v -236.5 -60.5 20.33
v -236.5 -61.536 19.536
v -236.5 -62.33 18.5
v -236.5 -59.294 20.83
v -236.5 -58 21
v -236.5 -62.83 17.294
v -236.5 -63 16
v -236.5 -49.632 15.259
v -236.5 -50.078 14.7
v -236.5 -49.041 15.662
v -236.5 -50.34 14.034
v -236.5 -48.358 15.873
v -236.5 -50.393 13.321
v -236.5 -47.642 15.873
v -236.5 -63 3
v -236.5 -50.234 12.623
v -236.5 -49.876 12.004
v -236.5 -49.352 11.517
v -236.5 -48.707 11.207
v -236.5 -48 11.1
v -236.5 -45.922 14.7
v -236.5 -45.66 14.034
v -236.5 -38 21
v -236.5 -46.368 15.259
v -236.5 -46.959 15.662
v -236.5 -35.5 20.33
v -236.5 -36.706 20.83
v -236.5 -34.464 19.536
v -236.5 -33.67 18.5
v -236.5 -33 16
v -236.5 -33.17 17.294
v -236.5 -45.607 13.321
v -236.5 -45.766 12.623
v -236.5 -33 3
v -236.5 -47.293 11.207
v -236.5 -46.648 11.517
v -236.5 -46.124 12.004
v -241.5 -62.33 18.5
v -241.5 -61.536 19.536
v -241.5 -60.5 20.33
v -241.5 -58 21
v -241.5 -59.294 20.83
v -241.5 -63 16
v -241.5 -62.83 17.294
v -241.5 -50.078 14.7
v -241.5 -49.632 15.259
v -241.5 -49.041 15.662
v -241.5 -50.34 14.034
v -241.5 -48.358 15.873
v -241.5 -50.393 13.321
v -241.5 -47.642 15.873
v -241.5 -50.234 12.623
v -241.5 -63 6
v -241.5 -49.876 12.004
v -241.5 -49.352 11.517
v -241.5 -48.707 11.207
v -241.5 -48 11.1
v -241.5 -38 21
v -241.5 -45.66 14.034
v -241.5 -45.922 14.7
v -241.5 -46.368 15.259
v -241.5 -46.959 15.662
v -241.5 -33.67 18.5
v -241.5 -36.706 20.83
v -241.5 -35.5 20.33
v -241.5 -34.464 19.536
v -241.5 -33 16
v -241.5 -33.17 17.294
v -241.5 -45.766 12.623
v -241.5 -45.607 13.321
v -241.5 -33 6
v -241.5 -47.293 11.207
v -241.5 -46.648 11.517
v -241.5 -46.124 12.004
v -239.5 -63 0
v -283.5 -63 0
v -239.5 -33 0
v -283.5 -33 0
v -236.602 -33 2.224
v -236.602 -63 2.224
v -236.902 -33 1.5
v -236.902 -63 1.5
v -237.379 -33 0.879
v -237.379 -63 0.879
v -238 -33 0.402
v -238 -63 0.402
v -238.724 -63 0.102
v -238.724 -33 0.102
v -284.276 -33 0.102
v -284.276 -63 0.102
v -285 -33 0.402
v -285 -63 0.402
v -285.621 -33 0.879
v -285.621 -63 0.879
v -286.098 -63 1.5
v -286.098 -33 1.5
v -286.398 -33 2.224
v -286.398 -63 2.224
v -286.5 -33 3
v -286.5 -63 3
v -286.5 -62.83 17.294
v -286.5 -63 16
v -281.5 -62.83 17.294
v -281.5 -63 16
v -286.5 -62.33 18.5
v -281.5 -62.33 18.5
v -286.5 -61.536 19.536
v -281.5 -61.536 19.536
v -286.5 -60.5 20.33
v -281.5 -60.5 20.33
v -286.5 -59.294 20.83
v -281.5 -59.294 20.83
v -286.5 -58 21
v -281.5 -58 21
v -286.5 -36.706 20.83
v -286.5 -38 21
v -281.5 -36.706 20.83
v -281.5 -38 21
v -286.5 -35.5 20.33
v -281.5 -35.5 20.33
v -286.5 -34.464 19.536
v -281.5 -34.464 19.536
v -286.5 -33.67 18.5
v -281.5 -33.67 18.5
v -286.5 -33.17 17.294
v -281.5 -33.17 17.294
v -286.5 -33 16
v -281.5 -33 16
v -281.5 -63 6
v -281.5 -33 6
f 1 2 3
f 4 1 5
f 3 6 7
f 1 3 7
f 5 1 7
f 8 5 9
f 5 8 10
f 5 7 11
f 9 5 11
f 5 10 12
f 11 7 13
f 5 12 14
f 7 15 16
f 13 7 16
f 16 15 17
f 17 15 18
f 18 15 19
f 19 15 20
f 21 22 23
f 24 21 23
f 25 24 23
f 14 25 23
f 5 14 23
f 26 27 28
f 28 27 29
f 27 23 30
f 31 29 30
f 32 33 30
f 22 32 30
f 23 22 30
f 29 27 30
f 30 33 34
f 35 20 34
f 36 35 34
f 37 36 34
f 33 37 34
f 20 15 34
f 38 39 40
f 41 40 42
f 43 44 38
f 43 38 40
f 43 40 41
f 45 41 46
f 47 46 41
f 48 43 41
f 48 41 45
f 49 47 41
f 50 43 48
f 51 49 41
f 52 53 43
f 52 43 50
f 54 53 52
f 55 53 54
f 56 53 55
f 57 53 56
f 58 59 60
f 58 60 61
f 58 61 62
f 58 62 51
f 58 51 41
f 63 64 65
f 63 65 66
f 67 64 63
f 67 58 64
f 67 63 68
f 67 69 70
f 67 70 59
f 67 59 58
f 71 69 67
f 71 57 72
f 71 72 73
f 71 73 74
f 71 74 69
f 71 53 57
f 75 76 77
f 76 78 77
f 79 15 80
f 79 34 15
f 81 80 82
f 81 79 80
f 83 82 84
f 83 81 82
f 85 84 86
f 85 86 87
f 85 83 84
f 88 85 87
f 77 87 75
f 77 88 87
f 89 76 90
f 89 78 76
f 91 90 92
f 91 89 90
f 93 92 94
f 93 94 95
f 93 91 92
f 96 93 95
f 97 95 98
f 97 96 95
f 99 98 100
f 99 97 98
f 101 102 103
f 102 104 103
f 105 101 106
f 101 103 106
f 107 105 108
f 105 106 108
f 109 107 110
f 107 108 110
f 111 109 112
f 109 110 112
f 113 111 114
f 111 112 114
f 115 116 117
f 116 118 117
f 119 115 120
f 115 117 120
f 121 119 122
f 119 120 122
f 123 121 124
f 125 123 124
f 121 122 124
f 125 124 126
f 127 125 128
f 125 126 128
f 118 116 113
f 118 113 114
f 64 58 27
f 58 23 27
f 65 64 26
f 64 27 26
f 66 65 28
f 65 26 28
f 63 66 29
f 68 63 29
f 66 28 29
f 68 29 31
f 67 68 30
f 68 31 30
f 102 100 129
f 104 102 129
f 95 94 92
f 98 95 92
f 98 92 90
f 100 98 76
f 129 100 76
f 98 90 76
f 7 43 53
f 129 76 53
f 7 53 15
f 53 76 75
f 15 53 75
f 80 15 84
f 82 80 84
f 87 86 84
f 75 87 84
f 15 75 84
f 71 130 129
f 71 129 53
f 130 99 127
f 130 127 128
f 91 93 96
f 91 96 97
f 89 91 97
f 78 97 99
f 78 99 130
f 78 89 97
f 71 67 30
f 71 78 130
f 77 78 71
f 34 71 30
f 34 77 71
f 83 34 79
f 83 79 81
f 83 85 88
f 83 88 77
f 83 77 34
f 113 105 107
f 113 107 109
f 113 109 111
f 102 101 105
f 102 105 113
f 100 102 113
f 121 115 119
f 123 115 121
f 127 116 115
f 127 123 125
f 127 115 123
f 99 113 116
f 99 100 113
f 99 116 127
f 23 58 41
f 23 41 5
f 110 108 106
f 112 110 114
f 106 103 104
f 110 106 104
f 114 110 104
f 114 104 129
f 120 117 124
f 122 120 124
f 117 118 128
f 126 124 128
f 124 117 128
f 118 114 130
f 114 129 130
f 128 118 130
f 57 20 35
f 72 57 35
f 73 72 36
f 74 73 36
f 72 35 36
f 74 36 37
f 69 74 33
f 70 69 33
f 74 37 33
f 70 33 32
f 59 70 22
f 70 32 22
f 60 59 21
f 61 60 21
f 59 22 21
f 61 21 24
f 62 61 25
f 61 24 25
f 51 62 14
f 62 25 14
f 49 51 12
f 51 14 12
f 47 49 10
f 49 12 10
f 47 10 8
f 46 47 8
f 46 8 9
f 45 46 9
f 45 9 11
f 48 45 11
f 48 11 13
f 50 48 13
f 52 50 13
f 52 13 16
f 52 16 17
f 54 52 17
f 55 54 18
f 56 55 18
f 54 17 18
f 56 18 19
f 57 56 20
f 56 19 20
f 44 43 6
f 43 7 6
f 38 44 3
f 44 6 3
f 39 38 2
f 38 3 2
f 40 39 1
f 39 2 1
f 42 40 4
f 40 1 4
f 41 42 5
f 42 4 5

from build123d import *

# Parameters (mm, degrees)
SKETCH1_W           = 50
SKETCH1_H           = 30
BOSS_EXTRUDE1_DEPTH = 6
SKETCH3_W           = 5
SKETCH3_H           = 30
BOSS_EXTRUDE2_DEPTH = 15
SKETCH4_R           = 2.4
CUT_EXTRUDE1_DEPTH  = 5
FILLET2_R           = 3
FILLET3_R           = 5


with BuildPart() as part:
    # Sketch1 → Boss-Extrude1 (new body)
    with BuildSketch(Plane.XY):
        with Locations((-261.5, -48)):
            Rectangle(SKETCH1_W, SKETCH1_H)
    extrude(amount=BOSS_EXTRUDE1_DEPTH)

    # Sketch3 → Boss-Extrude2 (add)
    with BuildSketch(Plane.XY.offset(6)):
        with Locations((-239, -48)):
            Rectangle(SKETCH3_W, SKETCH3_H)
        with Locations((-284, -48)):
            Rectangle(SKETCH3_W, SKETCH3_H)
    extrude(amount=BOSS_EXTRUDE2_DEPTH)

    # Sketch4 → Cut-Extrude1 (cut)
    with BuildSketch(Plane(origin=(-236.5, 0, 0), x_dir=(0, 0, -1), z_dir=(1, 0, 0))):
        with Locations((-13.5, -48)):
            Circle(SKETCH4_R)
    extrude(amount=-CUT_EXTRUDE1_DEPTH, mode=Mode.SUBTRACT)

    # Fillet2
    fillet2_edges = [part.edges().sort_by_distance(p)[0] for p in [
        (-236.5, -48, 0),
        (-286.5, -48, 0),
    ]]
    fillet(fillet2_edges, radius=FILLET2_R)

    # Fillet3
    fillet3_edges = [part.edges().sort_by_distance(p)[0] for p in [
        (-239, -33, 21),
        (-239, -63, 21),
        (-284, -63, 21),
        (-284, -33, 21),
    ]]
    fillet(fillet3_edges, radius=FILLET3_R)


solid = part.part
